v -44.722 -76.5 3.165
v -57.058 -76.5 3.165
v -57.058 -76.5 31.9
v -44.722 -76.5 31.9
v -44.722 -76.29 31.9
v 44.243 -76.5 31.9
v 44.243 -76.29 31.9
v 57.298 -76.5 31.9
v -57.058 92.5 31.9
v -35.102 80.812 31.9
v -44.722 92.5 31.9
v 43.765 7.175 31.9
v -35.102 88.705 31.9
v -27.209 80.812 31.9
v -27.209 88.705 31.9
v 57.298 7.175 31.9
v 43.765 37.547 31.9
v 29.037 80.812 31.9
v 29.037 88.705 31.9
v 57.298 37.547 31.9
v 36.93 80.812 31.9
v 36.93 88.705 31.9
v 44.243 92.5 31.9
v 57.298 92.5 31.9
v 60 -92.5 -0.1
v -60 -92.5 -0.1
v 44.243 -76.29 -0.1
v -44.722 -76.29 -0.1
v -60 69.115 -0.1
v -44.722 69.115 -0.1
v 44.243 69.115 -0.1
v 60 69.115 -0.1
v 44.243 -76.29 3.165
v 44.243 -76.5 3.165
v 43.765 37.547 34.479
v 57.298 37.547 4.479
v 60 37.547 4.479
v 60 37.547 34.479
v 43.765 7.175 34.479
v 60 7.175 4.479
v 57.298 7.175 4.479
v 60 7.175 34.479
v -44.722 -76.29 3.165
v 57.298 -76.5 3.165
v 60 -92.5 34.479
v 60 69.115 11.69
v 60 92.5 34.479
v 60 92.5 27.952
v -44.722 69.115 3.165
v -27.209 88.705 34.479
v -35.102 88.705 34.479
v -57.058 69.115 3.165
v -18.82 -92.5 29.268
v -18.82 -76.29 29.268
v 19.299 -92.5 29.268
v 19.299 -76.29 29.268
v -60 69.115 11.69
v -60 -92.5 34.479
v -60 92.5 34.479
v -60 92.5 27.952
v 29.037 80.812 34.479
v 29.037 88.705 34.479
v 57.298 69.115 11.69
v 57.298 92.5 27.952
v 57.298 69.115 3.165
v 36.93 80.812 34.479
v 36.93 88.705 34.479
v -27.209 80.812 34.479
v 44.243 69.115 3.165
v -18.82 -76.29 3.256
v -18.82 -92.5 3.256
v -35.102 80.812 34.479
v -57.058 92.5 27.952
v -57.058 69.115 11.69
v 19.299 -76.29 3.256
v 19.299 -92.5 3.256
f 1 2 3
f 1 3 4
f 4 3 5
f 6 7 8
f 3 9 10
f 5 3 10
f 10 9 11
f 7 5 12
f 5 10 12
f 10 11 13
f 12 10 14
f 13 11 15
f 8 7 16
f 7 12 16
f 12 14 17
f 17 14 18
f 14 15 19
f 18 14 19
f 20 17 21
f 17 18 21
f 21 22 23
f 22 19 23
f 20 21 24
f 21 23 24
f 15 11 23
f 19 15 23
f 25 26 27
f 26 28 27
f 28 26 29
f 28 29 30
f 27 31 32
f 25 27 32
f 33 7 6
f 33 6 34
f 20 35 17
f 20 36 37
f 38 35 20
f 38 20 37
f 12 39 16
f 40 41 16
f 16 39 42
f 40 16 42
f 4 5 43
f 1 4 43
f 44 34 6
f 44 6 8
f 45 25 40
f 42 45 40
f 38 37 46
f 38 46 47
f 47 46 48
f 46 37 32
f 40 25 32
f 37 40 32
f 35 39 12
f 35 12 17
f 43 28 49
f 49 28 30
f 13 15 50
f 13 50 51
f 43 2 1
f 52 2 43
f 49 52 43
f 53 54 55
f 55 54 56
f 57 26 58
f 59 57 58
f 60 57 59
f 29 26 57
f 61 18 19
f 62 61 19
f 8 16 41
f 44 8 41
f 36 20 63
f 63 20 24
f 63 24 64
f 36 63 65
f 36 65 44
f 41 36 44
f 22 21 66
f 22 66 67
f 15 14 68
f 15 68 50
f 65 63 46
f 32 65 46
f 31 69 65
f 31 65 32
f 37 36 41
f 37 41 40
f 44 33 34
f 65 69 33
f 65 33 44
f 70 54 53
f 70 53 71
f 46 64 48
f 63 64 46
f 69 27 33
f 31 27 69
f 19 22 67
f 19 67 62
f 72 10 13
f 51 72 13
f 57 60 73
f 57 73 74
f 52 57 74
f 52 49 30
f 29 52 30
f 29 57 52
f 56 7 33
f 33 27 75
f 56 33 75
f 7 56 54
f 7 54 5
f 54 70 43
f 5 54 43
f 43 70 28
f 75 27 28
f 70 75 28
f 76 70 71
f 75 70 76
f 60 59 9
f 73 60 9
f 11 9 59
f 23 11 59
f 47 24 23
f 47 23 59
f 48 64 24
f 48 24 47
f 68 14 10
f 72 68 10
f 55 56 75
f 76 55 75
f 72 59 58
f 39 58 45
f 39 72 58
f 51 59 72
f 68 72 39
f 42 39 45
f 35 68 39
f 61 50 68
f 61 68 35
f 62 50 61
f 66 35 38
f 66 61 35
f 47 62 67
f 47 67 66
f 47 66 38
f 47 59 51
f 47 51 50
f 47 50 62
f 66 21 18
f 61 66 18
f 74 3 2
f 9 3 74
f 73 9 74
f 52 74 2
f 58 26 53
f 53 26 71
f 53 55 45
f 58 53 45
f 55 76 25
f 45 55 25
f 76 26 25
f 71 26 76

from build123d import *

# Parameters (mm, degrees)
BOSS_EXTRUDE2_DEPTH      = 34.479411165
BOSS_EXTRUDE2_DEPTH_BACK = 0.1
SKETCH4_W                = 120
SKETCH4_H                = 185
SKETCH7_W                = 88.965159514
SKETCH7_H                = 168.79001582
CUT_EXTRUDE1_DEPTH       = 32
SKETCH8_W                = 38.11885966
SKETCH8_H                = 26.011926246
CUT_EXTRUDE2_DEPTH       = 32
SKETCH12_W               = 12.33668545
SKETCH12_H               = 28.735157877
SKETCH12_W_2             = 13.054734016
CUT_EXTRUDE10_DEPTH      = 169
CUT_EXTRUDE11_DEPTH      = 156.38687137
CUT_EXTRUDE11_DEPTH_BACK = 120
SKETCH14_W               = 7.893435911
SKETCH14_H               = 7.893435911
SKETCH14_W_2             = 7.893435912
CUT_EXTRUDE13_DEPTH      = 120
SKETCH16_W               = 16.234881207
SKETCH16_H               = 30.372514135
CUT_EXTRUDE15_DEPTH      = 30


with BuildPart() as part:
    # Sketch4 → Boss-Extrude2 (new, two sides: drawn at the far end of the back side and taken through both)
    with BuildSketch(Plane.XY.offset(-BOSS_EXTRUDE2_DEPTH_BACK)):
        Rectangle(SKETCH4_W, SKETCH4_H)
    extrude(amount=BOSS_EXTRUDE2_DEPTH + BOSS_EXTRUDE2_DEPTH_BACK)

    # Sketch7 → Cut-Extrude1 (cut)
    with BuildSketch(Plane(origin=(0, 0, -0.1), x_dir=(-1, 0, 0), z_dir=(0, 0, -1))):
        with Locations((0.239153655, 8.10499209)):
            Rectangle(SKETCH7_W, SKETCH7_H)
    extrude(amount=-CUT_EXTRUDE1_DEPTH, mode=Mode.SUBTRACT)

    # Sketch8 → Cut-Extrude2 (cut)
    with BuildSketch(Plane(origin=(0, -76.29001582, 0), x_dir=(1, 0, 0), z_dir=(0, 1, 0))):
        with Locations((0.239741256, -16.26190688)):
            Rectangle(SKETCH8_W, SKETCH8_H)
    extrude(amount=-CUT_EXTRUDE2_DEPTH, mode=Mode.SUBTRACT)

    # Sketch12 → Cut-Extrude10 (cut)
    with BuildSketch(Plane(origin=(0, 92.5, 0), x_dir=(1, 0, 0), z_dir=(0, 1, 0))):
        with Locations((-50.890076137, -17.532421062)):
            Rectangle(SKETCH12_W, SKETCH12_H)
        with Locations((50.77079311, -17.532421062)):
            Rectangle(SKETCH12_W_2, SKETCH12_H)
    extrude(amount=-CUT_EXTRUDE10_DEPTH, mode=Mode.SUBTRACT)

    # Sketch13 → Cut-Extrude11 (cut, two sides: drawn at the far end of the back side and taken through both)
    with BuildSketch(Plane(origin=(60, 0, 0), x_dir=(0, 0, -1), z_dir=(1, 0, 0)).offset(-CUT_EXTRUDE11_DEPTH_BACK)):
        Polygon((-247.325576021, 407.948170503), (-27.952099996, 92.5), (-11.689651482, 69.115406181), (0.1, 69.115406181), (384.329450013, 69.115406181), (747.583784475, 746.297338547), (115.928758441, 1085.130102868), align=None)
    extrude(amount=CUT_EXTRUDE11_DEPTH + CUT_EXTRUDE11_DEPTH_BACK, mode=Mode.SUBTRACT)

    # Sketch14 → Cut-Extrude13 (cut)
    with BuildSketch(Plane(origin=(0, 0, 31.9), x_dir=(-1, 0, 0), z_dir=(0, 0, -1))):
        with Locations((-32.983285774, 84.758555925)):
            Rectangle(SKETCH14_W, SKETCH14_H)
        with Locations((31.155523105, 84.758555925)):
            Rectangle(SKETCH14_W_2, SKETCH14_H)
    extrude(amount=-CUT_EXTRUDE13_DEPTH, mode=Mode.SUBTRACT)

    # Sketch16 → Cut-Extrude15 (cut)
    with BuildSketch(Plane.XY.offset(34.479411165)):
        with Locations((51.882559396, 22.360866706)):
            Rectangle(SKETCH16_W, SKETCH16_H)
    extrude(amount=-CUT_EXTRUDE15_DEPTH, mode=Mode.SUBTRACT)


solid = part.part
